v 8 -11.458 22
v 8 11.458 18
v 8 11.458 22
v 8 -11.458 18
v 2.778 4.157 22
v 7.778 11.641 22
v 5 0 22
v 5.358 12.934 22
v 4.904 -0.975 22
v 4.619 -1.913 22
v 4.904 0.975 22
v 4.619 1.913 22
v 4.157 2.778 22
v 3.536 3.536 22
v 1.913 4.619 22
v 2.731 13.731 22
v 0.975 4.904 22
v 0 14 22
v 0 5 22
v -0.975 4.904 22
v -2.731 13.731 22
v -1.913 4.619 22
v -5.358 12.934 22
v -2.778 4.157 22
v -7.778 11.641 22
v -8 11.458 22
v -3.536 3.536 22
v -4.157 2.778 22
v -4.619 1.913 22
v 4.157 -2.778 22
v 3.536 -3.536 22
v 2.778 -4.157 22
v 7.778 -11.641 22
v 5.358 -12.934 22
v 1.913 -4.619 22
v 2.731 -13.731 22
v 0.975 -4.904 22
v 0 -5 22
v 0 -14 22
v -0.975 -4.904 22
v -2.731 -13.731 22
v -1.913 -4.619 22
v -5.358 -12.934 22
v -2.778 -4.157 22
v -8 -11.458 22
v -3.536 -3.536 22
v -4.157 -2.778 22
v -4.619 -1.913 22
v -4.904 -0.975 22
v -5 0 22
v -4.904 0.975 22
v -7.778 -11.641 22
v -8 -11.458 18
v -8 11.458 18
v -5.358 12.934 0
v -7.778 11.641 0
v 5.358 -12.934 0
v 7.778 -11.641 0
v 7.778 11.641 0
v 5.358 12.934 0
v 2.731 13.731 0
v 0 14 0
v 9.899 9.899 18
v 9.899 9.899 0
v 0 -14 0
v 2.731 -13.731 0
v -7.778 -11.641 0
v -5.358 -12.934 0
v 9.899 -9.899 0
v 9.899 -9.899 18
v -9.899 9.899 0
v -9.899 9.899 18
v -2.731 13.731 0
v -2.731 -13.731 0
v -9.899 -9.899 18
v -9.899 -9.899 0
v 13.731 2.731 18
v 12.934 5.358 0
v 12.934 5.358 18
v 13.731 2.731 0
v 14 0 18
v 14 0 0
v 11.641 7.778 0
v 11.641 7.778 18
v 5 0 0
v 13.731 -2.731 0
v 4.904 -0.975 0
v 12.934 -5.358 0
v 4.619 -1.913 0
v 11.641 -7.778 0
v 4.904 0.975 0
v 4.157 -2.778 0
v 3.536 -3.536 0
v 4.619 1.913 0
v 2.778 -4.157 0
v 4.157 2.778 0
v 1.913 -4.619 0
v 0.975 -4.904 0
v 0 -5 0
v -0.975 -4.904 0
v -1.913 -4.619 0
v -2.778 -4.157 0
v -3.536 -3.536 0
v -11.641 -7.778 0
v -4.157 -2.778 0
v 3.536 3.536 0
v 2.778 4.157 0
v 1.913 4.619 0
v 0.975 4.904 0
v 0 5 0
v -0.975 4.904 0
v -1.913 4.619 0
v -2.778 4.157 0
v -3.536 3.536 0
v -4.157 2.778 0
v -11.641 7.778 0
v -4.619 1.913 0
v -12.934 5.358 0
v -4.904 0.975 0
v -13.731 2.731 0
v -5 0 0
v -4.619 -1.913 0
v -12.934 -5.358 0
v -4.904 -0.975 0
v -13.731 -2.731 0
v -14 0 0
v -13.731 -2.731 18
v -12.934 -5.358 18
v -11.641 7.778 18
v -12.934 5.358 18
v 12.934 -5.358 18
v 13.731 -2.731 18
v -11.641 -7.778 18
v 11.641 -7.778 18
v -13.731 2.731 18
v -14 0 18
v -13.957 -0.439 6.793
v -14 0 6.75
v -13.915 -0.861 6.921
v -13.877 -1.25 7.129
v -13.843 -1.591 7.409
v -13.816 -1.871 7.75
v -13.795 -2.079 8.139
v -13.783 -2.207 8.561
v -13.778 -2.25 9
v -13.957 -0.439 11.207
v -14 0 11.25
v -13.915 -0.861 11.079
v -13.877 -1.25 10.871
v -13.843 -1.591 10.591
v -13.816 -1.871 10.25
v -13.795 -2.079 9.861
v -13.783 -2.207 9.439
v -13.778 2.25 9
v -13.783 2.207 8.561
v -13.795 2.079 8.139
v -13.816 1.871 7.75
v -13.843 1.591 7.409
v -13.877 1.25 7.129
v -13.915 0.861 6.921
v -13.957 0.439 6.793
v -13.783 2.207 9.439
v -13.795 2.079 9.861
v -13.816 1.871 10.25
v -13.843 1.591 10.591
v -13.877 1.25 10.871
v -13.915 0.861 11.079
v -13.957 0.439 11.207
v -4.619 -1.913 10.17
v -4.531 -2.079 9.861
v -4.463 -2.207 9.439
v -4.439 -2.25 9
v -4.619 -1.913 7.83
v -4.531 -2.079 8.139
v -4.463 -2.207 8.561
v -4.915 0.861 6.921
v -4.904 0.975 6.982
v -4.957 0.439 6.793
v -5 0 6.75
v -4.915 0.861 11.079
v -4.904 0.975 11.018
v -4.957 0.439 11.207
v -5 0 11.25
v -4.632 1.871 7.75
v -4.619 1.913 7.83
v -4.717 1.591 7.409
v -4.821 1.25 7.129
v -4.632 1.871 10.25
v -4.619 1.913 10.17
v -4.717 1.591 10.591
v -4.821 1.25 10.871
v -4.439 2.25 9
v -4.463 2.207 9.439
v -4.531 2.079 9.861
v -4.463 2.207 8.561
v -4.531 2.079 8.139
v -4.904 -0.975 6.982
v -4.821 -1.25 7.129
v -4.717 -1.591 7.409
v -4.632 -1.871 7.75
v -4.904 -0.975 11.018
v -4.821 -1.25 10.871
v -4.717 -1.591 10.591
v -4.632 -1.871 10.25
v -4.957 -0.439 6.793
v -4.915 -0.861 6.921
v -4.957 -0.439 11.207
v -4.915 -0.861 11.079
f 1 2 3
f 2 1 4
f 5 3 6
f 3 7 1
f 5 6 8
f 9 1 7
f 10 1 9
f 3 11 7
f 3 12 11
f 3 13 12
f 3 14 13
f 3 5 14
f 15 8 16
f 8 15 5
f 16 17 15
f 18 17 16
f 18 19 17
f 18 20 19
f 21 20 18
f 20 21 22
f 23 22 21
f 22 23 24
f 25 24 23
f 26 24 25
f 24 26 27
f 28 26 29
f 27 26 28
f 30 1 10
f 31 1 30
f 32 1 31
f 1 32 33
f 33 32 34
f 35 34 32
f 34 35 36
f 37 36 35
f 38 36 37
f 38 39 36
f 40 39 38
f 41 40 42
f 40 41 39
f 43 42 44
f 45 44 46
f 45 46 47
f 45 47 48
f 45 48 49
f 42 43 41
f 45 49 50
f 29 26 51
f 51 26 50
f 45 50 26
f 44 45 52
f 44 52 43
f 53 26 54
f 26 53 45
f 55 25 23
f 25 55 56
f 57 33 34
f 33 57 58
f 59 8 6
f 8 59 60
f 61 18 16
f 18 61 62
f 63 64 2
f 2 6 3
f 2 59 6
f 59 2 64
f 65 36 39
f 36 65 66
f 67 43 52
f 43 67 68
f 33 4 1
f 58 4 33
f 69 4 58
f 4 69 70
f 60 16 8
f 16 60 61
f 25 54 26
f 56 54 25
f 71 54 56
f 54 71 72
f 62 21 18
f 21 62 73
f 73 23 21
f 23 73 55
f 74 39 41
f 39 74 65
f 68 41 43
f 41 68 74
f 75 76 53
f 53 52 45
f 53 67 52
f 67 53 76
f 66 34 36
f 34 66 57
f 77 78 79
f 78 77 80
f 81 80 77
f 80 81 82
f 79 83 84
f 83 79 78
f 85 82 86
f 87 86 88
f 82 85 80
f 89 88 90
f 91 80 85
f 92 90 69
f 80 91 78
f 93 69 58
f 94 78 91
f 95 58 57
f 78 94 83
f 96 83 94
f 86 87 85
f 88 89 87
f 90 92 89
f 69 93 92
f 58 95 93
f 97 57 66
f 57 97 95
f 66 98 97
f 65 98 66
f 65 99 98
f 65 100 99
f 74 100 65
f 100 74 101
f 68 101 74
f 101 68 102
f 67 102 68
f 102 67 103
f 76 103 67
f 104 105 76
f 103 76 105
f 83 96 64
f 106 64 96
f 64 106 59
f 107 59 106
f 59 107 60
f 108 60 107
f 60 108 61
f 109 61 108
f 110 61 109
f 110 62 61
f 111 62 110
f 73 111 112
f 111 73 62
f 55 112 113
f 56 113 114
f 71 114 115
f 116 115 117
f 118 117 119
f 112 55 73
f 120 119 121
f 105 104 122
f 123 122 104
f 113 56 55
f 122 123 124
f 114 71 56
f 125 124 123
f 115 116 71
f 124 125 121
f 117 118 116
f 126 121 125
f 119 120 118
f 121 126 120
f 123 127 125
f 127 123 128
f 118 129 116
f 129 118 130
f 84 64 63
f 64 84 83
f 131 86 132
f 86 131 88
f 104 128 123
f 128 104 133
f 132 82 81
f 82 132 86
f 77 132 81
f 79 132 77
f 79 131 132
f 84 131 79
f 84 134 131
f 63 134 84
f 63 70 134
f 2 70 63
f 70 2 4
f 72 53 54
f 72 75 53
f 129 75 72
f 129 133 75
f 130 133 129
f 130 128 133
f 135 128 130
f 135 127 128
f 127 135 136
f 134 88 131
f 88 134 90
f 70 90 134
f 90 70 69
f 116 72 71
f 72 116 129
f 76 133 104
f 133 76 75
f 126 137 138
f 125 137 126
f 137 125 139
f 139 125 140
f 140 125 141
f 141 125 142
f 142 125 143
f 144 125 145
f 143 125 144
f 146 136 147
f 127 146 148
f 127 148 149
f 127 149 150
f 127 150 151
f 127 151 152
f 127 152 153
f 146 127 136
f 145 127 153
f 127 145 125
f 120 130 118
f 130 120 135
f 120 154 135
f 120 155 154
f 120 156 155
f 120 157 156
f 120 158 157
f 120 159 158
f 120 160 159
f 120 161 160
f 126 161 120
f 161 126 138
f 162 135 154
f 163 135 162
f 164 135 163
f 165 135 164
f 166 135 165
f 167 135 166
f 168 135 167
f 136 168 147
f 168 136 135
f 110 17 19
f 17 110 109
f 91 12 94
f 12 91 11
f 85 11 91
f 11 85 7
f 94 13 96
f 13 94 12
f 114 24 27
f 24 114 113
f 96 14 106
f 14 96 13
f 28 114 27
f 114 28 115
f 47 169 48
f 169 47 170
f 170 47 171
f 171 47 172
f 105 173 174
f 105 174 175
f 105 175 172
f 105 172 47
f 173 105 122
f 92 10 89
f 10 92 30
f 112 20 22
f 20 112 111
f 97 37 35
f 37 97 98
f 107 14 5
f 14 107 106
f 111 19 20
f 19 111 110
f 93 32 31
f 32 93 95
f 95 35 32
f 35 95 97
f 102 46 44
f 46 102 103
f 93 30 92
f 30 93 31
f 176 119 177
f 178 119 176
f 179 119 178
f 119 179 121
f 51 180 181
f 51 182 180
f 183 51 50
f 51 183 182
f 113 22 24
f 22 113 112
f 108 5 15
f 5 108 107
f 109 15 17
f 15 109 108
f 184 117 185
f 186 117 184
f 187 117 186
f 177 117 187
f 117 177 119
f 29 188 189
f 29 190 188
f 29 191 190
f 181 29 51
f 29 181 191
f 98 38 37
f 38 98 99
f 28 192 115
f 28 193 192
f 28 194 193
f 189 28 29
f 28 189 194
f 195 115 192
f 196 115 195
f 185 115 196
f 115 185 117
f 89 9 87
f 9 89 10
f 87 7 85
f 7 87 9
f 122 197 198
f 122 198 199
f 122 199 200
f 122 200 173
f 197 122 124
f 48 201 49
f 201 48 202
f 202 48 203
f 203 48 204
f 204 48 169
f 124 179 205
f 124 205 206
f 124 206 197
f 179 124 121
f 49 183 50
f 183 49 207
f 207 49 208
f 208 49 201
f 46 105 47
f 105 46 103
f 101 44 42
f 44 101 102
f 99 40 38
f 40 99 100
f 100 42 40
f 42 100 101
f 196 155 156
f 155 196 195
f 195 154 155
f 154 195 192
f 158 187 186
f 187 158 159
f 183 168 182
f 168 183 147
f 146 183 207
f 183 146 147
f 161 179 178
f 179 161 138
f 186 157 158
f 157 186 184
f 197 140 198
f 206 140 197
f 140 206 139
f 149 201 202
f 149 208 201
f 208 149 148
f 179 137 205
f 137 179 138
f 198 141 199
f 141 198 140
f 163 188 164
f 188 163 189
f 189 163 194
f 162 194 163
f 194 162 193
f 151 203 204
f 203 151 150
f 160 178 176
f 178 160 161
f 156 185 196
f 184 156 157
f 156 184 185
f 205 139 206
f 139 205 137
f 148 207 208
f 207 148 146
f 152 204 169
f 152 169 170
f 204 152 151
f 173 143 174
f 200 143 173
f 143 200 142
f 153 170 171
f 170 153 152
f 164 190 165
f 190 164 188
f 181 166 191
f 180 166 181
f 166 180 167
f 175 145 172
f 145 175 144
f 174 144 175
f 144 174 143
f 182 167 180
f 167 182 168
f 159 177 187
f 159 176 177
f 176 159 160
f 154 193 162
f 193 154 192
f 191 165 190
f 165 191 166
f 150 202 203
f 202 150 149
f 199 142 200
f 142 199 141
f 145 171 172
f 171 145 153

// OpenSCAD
$fn = 32;

// ----------------------------------------------------------------------
// Oldham coupling hub: 28 x 22 mm
// ----------------------------------------------------------------------

// --- parameters (mm) ---
body_d = 28;              // hub diameter
body_l = 18;              // hub length
shaft_d = 10;             // shaft bore
cam_w = 16;               // drive tongue width
tongue_h = 4;             // drive tongue height
set_d = 4.5;              // set screw tap hole

module hub() {
  cylinder(h = body_l, d = body_d);
  /* tongue, clipped to the hub disc and sunk 1 mm into the face */
  intersection() {
    translate([-cam_w / 2, -body_d / 2, body_l - 1])
      cube([cam_w, body_d, tongue_h + 1]);
    translate([0, 0, body_l - 1]) cylinder(h = tongue_h + 1, d = body_d);
  }
}

difference() {
  hub();
  translate([0, 0, -1]) cylinder(h = body_l + tongue_h + 2, d = shaft_d);
  translate([-body_d / 2 - 1, 0, body_l * 0.5])
    rotate([0, 90, 0]) cylinder(h = body_d / 2 + 2, d = set_d);
}
